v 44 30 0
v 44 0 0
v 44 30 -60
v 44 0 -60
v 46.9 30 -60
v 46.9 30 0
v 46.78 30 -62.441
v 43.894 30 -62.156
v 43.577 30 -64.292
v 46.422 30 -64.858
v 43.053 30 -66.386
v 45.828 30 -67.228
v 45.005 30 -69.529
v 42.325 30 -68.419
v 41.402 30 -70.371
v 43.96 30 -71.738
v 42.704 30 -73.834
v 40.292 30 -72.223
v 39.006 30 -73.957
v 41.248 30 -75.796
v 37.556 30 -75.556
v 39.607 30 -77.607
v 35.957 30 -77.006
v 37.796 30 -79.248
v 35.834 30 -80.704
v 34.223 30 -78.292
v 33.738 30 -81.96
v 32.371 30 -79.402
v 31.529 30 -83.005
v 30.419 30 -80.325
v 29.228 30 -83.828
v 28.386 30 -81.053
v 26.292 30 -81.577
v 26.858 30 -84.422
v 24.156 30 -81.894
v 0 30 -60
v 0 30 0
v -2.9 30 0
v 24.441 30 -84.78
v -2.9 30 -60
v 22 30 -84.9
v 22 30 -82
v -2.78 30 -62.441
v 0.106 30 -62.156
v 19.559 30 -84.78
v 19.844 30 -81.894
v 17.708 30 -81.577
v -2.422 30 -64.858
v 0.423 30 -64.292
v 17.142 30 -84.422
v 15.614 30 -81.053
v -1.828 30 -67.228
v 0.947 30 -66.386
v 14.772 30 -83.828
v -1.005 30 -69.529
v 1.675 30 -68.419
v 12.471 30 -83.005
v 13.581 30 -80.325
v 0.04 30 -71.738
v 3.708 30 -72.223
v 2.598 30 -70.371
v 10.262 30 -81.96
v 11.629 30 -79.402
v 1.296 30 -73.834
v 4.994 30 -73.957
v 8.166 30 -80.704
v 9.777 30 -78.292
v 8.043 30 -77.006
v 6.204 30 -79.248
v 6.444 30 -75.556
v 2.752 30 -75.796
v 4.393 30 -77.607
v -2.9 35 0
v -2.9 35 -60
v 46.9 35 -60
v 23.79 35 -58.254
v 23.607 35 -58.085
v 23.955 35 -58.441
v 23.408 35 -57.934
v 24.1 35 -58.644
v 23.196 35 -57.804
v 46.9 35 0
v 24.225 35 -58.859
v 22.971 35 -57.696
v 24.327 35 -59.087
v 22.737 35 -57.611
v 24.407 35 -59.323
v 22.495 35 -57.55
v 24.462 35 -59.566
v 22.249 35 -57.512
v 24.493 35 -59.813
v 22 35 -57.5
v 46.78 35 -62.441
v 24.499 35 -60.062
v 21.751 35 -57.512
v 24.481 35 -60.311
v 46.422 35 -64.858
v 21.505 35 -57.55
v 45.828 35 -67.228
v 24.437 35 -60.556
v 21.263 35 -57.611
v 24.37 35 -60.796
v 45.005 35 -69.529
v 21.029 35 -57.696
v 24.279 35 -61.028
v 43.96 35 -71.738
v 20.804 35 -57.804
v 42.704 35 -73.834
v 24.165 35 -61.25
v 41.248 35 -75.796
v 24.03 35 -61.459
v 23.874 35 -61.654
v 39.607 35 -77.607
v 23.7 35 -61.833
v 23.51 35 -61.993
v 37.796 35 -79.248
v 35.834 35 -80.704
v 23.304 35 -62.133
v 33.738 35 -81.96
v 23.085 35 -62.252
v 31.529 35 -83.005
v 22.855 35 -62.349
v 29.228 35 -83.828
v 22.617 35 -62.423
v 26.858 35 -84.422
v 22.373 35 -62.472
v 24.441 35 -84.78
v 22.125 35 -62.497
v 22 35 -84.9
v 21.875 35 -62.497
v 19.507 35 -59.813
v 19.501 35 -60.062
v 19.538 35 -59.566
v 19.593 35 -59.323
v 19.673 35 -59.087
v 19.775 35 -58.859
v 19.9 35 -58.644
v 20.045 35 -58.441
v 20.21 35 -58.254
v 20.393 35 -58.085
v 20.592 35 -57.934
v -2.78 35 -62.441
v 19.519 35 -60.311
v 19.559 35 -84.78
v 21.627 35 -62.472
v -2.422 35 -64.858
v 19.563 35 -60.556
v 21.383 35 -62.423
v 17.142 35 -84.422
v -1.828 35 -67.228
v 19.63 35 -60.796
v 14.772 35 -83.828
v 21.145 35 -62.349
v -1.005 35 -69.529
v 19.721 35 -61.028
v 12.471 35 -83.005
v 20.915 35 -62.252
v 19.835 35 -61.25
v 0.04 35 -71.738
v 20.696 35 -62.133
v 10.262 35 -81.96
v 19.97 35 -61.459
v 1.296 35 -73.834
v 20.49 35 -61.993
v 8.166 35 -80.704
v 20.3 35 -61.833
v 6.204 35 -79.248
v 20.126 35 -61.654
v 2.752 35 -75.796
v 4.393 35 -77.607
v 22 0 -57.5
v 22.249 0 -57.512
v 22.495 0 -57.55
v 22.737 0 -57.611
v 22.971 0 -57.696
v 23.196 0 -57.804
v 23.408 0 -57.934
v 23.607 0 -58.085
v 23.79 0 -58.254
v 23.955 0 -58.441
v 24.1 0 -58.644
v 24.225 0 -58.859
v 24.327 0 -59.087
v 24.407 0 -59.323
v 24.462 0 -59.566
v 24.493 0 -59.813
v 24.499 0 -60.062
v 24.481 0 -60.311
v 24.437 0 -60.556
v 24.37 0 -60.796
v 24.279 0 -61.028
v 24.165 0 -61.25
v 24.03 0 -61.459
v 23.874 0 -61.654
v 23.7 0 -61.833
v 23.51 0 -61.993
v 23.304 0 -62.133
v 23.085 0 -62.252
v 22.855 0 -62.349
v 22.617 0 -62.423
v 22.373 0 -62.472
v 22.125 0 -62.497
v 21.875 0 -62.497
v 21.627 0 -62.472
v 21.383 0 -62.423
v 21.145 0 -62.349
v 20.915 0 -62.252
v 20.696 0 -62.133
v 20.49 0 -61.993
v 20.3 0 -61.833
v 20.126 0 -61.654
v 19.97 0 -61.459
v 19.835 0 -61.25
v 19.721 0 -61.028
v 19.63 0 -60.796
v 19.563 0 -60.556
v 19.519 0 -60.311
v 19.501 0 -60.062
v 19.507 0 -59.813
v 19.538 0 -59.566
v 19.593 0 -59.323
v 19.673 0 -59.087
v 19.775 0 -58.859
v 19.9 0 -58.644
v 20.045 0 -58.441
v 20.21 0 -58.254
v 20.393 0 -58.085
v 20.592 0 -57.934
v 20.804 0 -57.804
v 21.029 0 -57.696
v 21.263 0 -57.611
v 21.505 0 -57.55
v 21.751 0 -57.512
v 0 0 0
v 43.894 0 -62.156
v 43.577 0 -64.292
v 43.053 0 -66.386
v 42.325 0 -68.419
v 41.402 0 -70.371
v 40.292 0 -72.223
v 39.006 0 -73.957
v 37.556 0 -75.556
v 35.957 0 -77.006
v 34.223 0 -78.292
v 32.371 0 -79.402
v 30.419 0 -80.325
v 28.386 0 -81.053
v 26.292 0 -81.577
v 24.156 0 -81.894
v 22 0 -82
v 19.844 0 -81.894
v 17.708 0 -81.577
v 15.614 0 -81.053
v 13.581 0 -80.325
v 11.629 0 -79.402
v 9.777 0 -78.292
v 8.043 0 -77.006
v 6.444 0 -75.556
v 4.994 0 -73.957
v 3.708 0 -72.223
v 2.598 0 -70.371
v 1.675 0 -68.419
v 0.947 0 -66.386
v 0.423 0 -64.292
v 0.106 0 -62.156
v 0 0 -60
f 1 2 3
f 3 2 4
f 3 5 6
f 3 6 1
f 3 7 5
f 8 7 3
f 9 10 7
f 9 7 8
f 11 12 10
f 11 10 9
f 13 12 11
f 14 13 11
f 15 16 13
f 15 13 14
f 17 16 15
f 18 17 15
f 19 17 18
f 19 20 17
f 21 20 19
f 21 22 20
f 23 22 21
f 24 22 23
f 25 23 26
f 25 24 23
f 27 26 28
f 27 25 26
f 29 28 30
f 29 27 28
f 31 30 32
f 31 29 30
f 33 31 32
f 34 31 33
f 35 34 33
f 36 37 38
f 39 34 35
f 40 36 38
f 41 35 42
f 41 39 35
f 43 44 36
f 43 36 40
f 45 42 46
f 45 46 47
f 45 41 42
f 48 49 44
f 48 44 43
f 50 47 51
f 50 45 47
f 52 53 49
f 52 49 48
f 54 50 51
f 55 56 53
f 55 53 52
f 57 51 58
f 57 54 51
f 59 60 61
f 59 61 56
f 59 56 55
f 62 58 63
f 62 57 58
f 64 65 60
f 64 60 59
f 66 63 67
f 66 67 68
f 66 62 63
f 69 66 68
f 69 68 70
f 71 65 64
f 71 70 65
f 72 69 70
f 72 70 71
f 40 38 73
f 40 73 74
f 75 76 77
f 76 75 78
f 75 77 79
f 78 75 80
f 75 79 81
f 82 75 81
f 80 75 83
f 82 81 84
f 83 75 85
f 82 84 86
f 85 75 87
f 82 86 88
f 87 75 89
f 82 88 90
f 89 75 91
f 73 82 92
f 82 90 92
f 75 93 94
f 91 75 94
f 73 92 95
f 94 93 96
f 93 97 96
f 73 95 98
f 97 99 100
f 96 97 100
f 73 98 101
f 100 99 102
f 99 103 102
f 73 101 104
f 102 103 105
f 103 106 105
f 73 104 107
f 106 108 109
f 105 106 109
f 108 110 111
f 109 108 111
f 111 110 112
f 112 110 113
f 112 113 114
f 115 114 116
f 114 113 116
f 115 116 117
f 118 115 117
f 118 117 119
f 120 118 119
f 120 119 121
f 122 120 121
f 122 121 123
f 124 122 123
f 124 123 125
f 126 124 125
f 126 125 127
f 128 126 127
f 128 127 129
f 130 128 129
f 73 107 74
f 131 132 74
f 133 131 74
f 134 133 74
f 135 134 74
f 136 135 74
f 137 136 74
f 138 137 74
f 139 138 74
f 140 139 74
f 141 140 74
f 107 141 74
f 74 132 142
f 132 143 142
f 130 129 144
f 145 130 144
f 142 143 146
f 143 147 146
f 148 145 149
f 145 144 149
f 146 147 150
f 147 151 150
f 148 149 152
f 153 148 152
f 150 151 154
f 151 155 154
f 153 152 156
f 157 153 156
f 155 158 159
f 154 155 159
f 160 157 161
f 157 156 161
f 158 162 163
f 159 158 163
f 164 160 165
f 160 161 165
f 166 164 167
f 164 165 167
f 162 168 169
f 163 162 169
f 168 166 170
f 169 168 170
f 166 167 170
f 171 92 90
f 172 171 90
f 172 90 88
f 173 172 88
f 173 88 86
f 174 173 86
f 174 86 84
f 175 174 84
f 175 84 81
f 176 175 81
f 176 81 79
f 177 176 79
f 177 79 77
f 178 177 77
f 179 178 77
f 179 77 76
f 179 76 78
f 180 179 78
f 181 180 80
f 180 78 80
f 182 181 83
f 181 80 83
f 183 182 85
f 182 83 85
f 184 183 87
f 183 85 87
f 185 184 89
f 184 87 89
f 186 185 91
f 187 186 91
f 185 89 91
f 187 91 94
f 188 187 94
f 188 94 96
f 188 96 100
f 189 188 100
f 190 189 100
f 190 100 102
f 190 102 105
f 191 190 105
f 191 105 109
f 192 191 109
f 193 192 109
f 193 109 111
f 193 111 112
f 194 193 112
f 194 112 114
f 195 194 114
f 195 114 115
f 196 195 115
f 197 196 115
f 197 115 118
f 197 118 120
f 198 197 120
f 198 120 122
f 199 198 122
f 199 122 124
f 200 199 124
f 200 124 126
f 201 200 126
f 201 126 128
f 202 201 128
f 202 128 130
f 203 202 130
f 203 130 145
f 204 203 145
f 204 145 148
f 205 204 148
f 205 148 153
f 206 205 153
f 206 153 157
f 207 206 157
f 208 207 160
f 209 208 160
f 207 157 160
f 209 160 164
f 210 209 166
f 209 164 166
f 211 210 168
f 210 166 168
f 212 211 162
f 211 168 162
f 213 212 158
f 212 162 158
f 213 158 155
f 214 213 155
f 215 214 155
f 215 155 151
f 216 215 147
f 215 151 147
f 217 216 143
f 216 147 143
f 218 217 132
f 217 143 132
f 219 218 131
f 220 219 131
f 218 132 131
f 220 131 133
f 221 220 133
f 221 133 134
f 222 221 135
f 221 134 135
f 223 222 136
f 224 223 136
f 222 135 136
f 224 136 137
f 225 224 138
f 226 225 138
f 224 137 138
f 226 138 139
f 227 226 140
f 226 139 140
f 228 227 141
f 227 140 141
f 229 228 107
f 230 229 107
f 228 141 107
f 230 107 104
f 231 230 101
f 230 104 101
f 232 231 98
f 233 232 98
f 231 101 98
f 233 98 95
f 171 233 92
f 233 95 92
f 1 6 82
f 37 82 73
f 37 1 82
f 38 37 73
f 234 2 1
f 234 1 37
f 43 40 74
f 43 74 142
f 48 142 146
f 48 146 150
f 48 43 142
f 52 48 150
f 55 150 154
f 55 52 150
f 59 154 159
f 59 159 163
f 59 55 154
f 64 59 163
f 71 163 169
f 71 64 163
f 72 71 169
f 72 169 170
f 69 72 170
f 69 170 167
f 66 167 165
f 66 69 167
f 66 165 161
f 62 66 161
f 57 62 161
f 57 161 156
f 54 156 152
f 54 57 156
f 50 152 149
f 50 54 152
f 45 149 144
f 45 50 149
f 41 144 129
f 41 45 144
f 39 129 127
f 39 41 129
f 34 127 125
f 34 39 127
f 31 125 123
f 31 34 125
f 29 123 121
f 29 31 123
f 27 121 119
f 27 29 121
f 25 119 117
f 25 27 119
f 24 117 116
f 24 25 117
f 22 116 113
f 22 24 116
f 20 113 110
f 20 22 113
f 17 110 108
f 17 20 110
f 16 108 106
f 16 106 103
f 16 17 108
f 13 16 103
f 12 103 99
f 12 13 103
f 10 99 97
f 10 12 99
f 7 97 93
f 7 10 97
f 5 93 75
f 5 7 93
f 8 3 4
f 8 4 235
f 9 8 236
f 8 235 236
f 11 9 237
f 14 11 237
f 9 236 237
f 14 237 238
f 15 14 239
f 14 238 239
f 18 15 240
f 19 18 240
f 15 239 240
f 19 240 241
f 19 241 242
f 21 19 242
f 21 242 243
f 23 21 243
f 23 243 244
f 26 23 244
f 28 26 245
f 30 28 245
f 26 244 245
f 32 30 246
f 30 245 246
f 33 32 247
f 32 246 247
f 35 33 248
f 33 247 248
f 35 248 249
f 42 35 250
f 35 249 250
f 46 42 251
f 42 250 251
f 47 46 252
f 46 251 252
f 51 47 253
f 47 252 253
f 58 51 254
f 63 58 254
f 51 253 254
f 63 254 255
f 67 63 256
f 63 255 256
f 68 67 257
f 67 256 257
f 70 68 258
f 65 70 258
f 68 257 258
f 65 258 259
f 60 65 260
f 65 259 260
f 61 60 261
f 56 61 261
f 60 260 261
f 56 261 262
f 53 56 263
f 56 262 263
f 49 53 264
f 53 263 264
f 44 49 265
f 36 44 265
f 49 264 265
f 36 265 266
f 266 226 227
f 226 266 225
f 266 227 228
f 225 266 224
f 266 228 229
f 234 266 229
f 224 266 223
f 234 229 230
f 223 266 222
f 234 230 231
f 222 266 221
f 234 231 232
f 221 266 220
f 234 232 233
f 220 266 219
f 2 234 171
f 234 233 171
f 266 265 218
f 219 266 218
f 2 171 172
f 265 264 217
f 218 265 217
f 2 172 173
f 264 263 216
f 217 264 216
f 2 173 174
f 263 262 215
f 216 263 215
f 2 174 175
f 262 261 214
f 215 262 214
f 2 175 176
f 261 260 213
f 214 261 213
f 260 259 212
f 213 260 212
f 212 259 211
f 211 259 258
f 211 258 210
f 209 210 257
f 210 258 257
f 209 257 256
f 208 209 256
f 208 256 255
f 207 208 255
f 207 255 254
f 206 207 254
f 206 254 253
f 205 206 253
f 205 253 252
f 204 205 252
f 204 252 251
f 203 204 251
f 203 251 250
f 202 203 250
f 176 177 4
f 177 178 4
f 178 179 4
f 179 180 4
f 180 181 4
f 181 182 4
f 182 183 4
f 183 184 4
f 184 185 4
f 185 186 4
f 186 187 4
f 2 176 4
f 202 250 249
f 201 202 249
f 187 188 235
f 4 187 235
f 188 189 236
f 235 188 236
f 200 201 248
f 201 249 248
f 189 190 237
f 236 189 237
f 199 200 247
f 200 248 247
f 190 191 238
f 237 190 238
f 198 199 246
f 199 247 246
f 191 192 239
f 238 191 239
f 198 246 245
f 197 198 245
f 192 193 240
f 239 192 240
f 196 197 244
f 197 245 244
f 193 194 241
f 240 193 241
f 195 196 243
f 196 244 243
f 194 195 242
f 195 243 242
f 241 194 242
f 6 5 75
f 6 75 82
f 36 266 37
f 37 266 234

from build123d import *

# Parameters (mm, degrees)
BOSS_EXTRUDE1_DEPTH = 30
BOSS_EXTRUDE2_DEPTH = 5
SKETCH3_R           = 2.5
CUT_EXTRUDE1_DEPTH  = 104.114596445


with BuildPart() as part:
    # Sketch1 → Boss-Extrude1 (new body)
    with BuildSketch(Plane(origin=(0, 0, 0), x_dir=(1, 0, 0), z_dir=(0, 1, 0))):
        with BuildLine():
            Line((0, 0), (44, 0))
            Line((44, 0), (44, 60))
            ThreePointArc((44, 60), (22, 82), (0, 60))
            Line((0, 60), (0, 0))
        make_face()
    extrude(amount=BOSS_EXTRUDE1_DEPTH)

    # Sketch2 → Boss-Extrude2 (add)
    with BuildSketch(Plane(origin=(0, 30, 0), x_dir=(1, 0, 0), z_dir=(0, 1, 0))):
        with BuildLine():
            Line((46.9, 0), (-2.9, 0))
            Line((-2.9, 0), (-2.9, 60))
            ThreePointArc((-2.9, 60), (22, 84.9), (46.9, 60))
            Line((46.9, 60), (46.9, 0))
        make_face()
    extrude(amount=BOSS_EXTRUDE2_DEPTH)

    # Sketch3 → Cut-Extrude1 (cut, through all)
    with BuildSketch(Plane(origin=(0, 35, 0), x_dir=(1, 0, 0), z_dir=(0, 1, 0))):
        with Locations(Location((22, 60, 0), (0, 0, 270))):
            Circle(SKETCH3_R)
    extrude(amount=-CUT_EXTRUDE1_DEPTH, mode=Mode.SUBTRACT)


solid = part.part
